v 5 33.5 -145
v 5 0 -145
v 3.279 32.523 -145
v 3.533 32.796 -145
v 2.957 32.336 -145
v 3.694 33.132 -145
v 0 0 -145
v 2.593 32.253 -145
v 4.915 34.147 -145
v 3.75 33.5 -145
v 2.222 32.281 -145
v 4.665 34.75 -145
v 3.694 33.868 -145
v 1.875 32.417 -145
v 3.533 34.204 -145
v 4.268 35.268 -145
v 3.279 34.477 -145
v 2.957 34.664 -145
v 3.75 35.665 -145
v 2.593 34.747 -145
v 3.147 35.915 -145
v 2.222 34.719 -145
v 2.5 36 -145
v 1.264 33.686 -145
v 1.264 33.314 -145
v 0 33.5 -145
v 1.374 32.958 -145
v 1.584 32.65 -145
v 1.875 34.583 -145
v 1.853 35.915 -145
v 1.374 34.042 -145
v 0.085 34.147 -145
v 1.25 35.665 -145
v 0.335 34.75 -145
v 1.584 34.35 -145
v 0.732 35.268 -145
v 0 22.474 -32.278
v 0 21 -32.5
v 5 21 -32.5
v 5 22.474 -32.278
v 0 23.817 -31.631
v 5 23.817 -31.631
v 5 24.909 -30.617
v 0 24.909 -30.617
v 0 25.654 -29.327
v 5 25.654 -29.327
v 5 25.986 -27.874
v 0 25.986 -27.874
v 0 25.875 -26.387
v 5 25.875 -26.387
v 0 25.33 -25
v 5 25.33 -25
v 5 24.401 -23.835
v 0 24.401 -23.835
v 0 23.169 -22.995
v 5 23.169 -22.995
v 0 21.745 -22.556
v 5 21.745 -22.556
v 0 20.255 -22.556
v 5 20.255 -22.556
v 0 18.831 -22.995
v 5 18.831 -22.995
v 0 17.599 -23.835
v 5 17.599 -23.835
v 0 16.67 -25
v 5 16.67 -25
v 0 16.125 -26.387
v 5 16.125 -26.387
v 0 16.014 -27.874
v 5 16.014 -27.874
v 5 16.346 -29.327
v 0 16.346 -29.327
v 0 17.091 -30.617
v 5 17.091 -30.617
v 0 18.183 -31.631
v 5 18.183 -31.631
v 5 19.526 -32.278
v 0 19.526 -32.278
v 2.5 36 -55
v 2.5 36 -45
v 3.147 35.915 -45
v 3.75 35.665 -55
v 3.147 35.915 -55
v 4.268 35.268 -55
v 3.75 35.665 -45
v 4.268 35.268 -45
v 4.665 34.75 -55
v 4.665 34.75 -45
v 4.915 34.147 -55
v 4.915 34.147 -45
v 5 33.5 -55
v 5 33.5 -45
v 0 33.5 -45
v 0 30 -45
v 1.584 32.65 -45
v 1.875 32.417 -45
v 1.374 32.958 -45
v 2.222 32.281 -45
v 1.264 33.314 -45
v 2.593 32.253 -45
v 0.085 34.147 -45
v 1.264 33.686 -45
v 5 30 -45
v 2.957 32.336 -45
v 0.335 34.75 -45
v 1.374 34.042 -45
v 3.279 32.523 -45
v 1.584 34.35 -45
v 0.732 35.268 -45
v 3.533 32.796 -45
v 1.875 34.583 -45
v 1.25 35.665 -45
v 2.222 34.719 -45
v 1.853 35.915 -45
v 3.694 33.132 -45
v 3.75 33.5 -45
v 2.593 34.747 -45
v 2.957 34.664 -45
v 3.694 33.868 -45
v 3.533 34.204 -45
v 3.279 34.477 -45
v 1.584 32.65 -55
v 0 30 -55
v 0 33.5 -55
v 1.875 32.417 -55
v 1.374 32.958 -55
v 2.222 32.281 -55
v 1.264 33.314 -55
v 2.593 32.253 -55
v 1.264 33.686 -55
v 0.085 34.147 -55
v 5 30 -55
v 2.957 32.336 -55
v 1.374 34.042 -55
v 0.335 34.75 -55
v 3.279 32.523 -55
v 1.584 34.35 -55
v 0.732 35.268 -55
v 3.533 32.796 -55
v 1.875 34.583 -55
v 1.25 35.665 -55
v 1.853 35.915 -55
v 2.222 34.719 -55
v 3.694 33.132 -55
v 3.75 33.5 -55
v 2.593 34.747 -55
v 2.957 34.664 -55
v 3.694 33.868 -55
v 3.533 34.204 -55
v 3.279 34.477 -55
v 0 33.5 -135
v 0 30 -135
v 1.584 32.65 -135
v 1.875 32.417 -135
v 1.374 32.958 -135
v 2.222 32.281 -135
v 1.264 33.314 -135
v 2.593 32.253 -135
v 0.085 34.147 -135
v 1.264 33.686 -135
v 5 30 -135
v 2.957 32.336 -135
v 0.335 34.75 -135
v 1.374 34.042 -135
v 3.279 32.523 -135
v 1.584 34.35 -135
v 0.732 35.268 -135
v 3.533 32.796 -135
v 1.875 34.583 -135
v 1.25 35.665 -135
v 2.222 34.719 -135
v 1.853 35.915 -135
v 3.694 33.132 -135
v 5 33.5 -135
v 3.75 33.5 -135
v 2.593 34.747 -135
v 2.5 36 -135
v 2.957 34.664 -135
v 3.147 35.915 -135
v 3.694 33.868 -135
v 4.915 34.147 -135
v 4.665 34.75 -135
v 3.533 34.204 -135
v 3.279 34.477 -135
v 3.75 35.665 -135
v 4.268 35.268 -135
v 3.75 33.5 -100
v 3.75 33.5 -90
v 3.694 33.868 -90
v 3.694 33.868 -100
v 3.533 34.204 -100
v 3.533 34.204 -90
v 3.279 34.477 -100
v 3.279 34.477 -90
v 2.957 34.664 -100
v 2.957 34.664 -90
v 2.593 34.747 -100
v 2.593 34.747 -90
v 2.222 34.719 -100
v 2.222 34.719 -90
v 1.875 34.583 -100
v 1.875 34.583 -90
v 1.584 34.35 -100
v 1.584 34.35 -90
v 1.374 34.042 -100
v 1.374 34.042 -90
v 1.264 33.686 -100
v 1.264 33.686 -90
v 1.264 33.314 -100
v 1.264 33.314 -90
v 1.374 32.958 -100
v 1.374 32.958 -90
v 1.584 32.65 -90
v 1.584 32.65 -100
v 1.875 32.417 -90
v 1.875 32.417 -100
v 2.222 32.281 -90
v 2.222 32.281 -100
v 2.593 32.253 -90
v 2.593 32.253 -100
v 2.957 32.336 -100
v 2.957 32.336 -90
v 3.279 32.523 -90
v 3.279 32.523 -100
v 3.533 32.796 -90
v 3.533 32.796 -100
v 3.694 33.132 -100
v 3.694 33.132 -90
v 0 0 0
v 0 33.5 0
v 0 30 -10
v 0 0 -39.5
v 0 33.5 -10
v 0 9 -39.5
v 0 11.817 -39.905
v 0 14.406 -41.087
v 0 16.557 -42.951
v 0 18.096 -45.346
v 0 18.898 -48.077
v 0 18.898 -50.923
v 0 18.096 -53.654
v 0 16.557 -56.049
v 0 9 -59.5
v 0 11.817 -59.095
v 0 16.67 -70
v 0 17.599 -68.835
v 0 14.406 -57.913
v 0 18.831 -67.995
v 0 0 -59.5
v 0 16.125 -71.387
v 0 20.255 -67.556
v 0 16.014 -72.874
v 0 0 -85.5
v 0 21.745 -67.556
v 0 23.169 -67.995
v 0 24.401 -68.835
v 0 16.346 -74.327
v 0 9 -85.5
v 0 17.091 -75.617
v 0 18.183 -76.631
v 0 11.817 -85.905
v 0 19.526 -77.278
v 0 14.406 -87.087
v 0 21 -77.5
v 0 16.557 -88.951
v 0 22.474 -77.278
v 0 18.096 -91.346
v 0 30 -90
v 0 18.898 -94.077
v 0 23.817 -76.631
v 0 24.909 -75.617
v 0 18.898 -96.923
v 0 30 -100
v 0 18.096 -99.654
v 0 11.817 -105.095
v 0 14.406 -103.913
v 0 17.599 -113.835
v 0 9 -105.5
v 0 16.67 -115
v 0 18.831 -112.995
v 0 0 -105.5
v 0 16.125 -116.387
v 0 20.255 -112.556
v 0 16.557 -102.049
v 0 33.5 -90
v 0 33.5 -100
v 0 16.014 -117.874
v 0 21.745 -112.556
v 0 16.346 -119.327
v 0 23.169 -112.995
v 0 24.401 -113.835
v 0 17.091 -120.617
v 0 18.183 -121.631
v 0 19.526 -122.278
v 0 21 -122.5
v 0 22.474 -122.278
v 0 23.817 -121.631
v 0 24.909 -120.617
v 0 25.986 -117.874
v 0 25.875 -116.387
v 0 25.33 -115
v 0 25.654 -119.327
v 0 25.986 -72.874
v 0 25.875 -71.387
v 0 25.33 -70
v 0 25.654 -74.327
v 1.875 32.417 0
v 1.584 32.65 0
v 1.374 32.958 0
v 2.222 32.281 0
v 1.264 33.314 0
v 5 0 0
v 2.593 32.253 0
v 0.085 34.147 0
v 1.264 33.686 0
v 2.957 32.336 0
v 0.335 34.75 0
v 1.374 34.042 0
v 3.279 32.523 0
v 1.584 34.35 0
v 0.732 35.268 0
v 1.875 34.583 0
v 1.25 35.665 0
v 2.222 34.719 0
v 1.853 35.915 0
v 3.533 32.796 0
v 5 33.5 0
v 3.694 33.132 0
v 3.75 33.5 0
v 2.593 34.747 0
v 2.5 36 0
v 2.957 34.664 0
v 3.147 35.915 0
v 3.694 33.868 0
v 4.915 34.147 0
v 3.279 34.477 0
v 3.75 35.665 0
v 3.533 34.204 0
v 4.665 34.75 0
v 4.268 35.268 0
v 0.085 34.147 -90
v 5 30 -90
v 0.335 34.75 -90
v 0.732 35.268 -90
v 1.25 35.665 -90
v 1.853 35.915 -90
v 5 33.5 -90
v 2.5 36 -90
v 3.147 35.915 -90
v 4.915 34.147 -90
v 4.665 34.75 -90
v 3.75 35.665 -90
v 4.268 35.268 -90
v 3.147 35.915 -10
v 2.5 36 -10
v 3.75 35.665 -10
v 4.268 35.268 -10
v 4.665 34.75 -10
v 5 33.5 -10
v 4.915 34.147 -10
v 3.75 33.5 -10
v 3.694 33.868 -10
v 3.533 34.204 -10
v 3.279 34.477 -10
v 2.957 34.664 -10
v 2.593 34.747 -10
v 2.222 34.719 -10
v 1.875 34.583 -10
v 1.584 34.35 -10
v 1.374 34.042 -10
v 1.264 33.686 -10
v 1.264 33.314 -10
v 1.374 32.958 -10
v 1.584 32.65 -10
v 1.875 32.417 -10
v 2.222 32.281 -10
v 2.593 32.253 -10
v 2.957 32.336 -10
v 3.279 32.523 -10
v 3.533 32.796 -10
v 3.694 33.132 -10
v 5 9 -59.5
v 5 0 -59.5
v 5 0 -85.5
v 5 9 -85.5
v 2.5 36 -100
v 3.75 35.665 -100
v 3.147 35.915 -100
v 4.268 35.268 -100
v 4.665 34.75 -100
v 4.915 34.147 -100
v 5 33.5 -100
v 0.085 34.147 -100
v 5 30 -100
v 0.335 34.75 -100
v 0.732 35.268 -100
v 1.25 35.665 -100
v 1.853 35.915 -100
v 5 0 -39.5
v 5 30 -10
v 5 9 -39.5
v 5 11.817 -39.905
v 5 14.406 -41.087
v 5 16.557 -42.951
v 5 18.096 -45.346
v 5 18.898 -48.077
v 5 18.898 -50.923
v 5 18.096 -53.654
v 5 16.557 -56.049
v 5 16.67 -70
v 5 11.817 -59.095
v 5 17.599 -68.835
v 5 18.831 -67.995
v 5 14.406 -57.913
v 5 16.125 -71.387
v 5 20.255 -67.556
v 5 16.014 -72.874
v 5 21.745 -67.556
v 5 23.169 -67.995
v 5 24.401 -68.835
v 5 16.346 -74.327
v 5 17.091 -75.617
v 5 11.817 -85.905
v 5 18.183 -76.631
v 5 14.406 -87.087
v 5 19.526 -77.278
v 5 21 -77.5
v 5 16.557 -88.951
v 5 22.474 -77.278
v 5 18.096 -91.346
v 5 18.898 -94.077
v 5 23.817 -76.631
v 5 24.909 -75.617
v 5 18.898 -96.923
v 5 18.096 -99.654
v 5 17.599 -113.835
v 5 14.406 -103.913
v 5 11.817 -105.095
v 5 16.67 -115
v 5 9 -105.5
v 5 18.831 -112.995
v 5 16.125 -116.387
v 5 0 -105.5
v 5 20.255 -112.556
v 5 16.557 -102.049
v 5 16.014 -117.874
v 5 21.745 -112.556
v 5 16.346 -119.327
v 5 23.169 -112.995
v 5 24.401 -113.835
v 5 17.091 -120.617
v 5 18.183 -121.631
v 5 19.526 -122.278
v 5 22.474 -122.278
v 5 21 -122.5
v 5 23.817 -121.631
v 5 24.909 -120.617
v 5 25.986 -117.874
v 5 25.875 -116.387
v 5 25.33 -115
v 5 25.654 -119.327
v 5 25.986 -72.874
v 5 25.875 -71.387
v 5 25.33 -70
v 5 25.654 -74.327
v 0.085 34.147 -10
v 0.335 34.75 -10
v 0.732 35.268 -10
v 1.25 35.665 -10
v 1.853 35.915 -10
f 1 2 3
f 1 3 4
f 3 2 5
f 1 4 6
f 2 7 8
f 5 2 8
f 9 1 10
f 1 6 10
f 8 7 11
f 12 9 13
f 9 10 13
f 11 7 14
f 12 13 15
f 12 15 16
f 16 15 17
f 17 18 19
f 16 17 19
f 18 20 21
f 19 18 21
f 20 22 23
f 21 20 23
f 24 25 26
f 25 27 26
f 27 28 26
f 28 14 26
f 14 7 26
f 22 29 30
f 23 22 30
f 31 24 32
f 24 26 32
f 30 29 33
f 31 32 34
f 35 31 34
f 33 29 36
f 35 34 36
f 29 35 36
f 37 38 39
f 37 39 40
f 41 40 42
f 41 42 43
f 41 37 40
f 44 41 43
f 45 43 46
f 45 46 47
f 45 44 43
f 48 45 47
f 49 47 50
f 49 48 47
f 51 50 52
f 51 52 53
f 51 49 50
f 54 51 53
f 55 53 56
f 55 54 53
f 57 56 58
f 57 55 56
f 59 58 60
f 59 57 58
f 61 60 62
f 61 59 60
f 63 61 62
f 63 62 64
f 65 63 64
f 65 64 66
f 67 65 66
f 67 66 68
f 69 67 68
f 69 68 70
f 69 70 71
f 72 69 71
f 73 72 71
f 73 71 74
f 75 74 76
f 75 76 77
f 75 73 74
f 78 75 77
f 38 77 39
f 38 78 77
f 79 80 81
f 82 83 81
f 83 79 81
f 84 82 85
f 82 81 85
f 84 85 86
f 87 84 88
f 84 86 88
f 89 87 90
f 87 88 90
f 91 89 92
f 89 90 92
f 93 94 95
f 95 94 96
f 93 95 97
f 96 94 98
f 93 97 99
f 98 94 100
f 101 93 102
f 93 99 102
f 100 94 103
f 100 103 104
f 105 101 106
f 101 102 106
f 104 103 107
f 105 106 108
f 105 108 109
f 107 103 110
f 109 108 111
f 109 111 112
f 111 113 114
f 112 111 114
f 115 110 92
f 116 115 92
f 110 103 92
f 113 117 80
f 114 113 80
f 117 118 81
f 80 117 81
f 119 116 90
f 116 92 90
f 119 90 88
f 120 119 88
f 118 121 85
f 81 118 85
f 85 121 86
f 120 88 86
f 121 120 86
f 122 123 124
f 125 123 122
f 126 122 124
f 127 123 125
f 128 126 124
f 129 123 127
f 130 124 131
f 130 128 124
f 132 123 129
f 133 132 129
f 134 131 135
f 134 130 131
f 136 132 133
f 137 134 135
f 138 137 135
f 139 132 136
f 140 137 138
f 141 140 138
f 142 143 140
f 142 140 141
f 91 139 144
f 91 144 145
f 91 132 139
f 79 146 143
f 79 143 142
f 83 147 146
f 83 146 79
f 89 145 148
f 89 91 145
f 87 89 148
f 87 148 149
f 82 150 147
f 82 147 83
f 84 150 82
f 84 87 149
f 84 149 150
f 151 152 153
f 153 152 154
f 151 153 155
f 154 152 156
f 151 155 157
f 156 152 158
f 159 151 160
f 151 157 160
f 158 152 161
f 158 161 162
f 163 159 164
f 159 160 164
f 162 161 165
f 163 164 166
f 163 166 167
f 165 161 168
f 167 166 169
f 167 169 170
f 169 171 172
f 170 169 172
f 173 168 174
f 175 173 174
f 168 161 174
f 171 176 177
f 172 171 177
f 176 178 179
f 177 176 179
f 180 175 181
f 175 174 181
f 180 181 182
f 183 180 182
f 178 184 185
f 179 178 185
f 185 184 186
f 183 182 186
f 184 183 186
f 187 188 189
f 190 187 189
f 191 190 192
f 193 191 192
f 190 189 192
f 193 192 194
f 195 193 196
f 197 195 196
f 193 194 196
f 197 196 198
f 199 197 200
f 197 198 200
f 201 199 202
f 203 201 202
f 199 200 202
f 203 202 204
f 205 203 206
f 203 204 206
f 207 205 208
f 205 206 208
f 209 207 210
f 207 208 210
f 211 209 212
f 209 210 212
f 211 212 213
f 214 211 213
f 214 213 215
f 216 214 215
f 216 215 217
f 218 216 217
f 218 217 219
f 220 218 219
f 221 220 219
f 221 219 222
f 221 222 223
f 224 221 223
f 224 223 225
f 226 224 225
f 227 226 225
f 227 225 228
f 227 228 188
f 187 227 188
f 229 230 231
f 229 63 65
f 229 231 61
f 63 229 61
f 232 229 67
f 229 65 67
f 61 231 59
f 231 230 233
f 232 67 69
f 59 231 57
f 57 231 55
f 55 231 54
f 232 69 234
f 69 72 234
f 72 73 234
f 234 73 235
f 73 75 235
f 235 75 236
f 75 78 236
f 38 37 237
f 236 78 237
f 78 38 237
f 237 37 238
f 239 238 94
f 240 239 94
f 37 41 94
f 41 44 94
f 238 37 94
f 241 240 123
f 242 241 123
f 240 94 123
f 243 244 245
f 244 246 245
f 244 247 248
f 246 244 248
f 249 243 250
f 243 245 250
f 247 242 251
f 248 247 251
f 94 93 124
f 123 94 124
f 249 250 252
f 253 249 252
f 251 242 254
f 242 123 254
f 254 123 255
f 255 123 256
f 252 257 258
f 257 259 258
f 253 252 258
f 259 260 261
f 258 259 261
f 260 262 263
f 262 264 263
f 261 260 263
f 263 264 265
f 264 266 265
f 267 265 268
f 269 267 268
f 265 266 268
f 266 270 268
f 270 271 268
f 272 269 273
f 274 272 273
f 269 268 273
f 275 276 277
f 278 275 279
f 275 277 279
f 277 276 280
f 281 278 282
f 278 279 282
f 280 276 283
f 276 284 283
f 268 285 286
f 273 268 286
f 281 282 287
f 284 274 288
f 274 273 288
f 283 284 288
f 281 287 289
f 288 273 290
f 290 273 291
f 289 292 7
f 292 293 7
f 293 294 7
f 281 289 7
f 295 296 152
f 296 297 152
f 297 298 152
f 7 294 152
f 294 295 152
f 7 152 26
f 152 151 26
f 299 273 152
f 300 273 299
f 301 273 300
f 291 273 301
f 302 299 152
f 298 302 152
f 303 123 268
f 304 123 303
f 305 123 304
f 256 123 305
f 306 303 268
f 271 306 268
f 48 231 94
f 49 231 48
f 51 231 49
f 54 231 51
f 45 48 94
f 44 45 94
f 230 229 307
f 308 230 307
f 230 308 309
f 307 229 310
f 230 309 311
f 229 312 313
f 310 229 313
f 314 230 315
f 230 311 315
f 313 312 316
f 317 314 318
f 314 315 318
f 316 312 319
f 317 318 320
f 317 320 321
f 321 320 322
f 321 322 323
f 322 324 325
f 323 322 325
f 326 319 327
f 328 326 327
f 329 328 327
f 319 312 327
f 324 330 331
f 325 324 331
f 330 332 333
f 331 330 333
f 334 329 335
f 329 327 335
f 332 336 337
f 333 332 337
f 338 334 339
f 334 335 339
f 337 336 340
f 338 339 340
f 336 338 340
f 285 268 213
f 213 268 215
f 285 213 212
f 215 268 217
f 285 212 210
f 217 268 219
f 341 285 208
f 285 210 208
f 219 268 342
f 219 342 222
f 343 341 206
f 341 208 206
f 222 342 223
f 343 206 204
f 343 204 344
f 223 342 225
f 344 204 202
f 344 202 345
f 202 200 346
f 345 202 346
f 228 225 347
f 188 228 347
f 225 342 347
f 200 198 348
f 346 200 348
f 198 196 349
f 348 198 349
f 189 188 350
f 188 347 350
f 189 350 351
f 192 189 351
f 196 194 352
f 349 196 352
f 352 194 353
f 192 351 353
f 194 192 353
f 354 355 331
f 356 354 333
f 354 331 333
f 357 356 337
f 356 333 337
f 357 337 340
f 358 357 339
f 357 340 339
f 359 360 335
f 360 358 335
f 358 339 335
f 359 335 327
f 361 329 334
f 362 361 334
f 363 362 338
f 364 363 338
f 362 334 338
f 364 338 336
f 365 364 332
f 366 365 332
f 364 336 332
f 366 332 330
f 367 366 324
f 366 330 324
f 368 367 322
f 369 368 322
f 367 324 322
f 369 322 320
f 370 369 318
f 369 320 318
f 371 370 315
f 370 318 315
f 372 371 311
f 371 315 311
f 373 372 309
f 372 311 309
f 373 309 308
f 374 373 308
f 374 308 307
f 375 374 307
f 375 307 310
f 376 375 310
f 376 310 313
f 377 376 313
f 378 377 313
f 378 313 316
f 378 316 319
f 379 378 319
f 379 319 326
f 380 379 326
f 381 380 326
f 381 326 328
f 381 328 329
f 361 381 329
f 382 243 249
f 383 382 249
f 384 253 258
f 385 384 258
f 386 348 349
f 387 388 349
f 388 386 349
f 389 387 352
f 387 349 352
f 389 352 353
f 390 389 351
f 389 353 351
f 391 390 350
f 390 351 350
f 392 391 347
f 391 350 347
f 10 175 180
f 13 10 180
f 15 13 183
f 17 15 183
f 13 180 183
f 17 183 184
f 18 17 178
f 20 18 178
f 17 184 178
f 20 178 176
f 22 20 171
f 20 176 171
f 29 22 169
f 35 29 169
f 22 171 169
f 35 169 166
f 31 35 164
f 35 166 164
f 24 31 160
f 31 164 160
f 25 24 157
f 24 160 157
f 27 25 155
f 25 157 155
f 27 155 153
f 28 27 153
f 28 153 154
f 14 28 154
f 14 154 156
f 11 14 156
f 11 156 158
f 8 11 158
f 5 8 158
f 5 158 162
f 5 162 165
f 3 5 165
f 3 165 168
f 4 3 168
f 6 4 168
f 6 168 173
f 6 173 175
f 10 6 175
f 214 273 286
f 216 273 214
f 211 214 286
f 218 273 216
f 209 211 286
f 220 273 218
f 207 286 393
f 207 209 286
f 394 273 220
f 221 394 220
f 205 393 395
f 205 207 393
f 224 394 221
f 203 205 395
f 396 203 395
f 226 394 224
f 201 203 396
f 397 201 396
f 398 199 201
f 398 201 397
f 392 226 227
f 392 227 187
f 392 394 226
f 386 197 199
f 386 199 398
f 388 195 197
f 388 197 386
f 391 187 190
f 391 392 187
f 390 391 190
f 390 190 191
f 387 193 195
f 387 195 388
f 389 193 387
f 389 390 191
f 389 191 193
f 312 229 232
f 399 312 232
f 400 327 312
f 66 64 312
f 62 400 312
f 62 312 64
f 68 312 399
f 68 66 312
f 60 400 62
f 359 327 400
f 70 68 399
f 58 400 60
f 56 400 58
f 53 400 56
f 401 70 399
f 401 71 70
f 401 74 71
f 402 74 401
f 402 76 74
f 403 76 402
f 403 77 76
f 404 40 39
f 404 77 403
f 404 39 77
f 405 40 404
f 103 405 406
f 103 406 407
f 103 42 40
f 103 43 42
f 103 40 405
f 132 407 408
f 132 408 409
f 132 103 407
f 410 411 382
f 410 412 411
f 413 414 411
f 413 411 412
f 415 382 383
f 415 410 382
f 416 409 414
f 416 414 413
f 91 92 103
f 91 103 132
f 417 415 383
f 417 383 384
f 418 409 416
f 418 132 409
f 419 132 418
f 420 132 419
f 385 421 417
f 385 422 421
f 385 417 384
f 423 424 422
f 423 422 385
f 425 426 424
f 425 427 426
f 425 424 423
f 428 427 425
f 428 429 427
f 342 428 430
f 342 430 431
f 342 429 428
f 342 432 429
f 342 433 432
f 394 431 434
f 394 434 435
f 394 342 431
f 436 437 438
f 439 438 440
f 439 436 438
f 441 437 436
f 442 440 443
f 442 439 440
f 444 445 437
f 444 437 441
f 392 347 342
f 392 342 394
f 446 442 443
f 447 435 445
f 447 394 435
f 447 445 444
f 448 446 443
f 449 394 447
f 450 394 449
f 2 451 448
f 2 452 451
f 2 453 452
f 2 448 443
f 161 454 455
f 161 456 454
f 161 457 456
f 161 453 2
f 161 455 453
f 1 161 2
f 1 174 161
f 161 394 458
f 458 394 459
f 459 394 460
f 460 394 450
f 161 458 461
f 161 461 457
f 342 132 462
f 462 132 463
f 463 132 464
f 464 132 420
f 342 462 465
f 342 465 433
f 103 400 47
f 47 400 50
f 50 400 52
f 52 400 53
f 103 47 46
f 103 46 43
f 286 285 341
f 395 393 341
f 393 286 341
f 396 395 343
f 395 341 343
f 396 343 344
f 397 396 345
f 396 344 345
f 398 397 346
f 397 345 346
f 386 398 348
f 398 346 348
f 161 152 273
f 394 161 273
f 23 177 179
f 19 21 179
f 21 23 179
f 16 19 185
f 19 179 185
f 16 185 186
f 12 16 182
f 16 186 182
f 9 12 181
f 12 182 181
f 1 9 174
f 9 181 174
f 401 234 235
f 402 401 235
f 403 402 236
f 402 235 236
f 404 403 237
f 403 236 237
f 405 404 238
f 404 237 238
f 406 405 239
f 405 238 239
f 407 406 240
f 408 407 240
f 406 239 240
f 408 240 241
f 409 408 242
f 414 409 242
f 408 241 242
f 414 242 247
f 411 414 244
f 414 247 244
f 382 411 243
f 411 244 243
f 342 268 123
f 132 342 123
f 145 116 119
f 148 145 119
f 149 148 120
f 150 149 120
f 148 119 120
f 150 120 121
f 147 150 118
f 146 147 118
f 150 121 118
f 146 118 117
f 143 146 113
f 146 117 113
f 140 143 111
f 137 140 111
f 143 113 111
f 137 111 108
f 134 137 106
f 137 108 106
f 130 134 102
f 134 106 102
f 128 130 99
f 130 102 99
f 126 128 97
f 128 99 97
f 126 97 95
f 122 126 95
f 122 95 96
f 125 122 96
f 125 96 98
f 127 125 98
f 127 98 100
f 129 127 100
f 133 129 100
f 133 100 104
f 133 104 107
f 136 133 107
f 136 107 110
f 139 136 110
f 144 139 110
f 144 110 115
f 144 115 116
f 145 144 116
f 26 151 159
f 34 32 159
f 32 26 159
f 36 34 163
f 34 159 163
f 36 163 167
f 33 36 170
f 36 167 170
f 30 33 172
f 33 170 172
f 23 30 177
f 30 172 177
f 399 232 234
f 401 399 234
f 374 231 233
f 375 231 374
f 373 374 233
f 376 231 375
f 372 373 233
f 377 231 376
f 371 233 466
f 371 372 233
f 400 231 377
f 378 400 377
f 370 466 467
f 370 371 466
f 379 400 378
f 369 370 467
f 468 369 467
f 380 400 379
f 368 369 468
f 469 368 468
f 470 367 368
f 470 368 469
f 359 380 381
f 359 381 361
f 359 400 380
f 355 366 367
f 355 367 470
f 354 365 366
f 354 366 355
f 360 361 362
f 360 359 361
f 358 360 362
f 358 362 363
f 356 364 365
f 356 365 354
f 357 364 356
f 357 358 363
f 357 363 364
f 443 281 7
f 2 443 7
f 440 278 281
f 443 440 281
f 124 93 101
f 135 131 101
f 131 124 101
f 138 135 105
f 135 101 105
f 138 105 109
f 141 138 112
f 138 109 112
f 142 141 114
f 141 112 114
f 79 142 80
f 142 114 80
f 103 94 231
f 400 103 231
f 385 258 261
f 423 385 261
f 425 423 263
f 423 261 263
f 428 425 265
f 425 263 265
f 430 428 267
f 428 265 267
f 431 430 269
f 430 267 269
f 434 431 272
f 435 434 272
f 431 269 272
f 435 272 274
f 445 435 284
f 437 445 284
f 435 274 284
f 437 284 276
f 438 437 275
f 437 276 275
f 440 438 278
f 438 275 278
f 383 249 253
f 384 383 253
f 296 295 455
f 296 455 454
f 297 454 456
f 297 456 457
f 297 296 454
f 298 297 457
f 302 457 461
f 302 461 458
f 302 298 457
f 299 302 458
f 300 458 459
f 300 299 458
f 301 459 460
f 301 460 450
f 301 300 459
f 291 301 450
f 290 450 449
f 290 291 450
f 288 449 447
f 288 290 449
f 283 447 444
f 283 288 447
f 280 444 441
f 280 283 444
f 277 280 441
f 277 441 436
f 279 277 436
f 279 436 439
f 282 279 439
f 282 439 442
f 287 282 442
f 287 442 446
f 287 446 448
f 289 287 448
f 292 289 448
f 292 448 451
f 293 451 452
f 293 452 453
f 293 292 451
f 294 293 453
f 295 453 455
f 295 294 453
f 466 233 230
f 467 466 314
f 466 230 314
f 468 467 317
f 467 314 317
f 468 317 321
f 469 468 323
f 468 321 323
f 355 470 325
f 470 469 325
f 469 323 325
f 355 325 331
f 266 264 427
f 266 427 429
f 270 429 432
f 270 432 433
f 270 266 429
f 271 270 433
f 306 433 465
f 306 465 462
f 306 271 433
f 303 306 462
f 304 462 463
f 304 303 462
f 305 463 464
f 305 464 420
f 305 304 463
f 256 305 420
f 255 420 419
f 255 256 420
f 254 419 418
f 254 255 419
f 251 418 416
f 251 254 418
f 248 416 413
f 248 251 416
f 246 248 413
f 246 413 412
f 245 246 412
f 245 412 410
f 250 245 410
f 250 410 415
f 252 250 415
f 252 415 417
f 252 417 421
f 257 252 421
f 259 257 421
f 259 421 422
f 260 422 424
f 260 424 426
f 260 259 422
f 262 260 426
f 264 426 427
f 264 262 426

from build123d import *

# Parameters (mm, degrees)
SKETCH_1_R          = 5
EXTRUDE_1_DEPTH     = 5
SKETCH_2_W          = 10
SKETCH_2_H          = 6
EXTRUDE_2_DEPTH     = 5
SKETCH_3_R          = 1.25
CUT_EXTRUDE_2_DEPTH = 150.485785277


with BuildPart() as part:
    # Эскиз1 → Бобышка-Вытянуть1 (new body)
    with BuildSketch(Plane(origin=(0, 0, 0), x_dir=(0, 0, -1), z_dir=(1, 0, 0))):
        with BuildLine():
            Line((0, 0), (39.5, 0))
            Line((39.5, 0), (39.5, 9))
            ThreePointArc((39.5, 9), (49.5, 19), (59.5, 9))
            Line((59.5, 9), (59.5, 0))
            Line((59.5, 0), (85.5, 0))
            Line((85.5, 0), (85.5, 9))
            ThreePointArc((85.5, 9), (95.5, 19), (105.5, 9))
            Line((105.5, 9), (105.5, 0))
            Line((105.5, 0), (145, 0))
            Line((145, 0), (145, 30))
            Line((145, 30), (0, 30))
            Line((0, 30), (0, 0))
        make_face()
        with Locations((27.5, 21)):
            Circle(SKETCH_1_R, mode=Mode.SUBTRACT)
        with Locations((72.5, 21)):
            Circle(SKETCH_1_R, mode=Mode.SUBTRACT)
        with Locations((117.5, 21)):
            Circle(SKETCH_1_R, mode=Mode.SUBTRACT)
    extrude(amount=EXTRUDE_1_DEPTH)

    # Эскиз2 → Бобышка-Вытянуть2 (add)
    with BuildSketch(Plane(origin=(5, 0, 0), x_dir=(0, 0, -1), z_dir=(1, 0, 0))):
        with Locations((5, 33)):
            Rectangle(SKETCH_2_W, SKETCH_2_H)
        with Locations((50, 33)):
            Rectangle(SKETCH_2_W, SKETCH_2_H)
        with Locations((95, 33)):
            Rectangle(SKETCH_2_W, SKETCH_2_H)
        with Locations((140, 33)):
            Rectangle(SKETCH_2_W, SKETCH_2_H)
    extrude(amount=-EXTRUDE_2_DEPTH)

    # Эскиз3 → Вырез-Вытянуть2 (cut, through all)
    with BuildSketch(Plane.XY):
        with BuildLine():
            Line((0, 36), (0, 33.5))
            ThreePointArc((0, 33.5), (0.732233047, 35.267766953), (2.5, 36))
            Line((2.5, 36), (0, 36))
        make_face()
        with BuildLine():
            ThreePointArc((2.5, 36), (4.267766953, 35.267766953), (5, 33.5))
            Line((5, 33.5), (5, 36))
            Line((5, 36), (2.5, 36))
        make_face()
        with Locations((2.5, 33.5)):
            Circle(SKETCH_3_R)
    extrude(amount=-CUT_EXTRUDE_2_DEPTH, mode=Mode.SUBTRACT)


solid = part.part
